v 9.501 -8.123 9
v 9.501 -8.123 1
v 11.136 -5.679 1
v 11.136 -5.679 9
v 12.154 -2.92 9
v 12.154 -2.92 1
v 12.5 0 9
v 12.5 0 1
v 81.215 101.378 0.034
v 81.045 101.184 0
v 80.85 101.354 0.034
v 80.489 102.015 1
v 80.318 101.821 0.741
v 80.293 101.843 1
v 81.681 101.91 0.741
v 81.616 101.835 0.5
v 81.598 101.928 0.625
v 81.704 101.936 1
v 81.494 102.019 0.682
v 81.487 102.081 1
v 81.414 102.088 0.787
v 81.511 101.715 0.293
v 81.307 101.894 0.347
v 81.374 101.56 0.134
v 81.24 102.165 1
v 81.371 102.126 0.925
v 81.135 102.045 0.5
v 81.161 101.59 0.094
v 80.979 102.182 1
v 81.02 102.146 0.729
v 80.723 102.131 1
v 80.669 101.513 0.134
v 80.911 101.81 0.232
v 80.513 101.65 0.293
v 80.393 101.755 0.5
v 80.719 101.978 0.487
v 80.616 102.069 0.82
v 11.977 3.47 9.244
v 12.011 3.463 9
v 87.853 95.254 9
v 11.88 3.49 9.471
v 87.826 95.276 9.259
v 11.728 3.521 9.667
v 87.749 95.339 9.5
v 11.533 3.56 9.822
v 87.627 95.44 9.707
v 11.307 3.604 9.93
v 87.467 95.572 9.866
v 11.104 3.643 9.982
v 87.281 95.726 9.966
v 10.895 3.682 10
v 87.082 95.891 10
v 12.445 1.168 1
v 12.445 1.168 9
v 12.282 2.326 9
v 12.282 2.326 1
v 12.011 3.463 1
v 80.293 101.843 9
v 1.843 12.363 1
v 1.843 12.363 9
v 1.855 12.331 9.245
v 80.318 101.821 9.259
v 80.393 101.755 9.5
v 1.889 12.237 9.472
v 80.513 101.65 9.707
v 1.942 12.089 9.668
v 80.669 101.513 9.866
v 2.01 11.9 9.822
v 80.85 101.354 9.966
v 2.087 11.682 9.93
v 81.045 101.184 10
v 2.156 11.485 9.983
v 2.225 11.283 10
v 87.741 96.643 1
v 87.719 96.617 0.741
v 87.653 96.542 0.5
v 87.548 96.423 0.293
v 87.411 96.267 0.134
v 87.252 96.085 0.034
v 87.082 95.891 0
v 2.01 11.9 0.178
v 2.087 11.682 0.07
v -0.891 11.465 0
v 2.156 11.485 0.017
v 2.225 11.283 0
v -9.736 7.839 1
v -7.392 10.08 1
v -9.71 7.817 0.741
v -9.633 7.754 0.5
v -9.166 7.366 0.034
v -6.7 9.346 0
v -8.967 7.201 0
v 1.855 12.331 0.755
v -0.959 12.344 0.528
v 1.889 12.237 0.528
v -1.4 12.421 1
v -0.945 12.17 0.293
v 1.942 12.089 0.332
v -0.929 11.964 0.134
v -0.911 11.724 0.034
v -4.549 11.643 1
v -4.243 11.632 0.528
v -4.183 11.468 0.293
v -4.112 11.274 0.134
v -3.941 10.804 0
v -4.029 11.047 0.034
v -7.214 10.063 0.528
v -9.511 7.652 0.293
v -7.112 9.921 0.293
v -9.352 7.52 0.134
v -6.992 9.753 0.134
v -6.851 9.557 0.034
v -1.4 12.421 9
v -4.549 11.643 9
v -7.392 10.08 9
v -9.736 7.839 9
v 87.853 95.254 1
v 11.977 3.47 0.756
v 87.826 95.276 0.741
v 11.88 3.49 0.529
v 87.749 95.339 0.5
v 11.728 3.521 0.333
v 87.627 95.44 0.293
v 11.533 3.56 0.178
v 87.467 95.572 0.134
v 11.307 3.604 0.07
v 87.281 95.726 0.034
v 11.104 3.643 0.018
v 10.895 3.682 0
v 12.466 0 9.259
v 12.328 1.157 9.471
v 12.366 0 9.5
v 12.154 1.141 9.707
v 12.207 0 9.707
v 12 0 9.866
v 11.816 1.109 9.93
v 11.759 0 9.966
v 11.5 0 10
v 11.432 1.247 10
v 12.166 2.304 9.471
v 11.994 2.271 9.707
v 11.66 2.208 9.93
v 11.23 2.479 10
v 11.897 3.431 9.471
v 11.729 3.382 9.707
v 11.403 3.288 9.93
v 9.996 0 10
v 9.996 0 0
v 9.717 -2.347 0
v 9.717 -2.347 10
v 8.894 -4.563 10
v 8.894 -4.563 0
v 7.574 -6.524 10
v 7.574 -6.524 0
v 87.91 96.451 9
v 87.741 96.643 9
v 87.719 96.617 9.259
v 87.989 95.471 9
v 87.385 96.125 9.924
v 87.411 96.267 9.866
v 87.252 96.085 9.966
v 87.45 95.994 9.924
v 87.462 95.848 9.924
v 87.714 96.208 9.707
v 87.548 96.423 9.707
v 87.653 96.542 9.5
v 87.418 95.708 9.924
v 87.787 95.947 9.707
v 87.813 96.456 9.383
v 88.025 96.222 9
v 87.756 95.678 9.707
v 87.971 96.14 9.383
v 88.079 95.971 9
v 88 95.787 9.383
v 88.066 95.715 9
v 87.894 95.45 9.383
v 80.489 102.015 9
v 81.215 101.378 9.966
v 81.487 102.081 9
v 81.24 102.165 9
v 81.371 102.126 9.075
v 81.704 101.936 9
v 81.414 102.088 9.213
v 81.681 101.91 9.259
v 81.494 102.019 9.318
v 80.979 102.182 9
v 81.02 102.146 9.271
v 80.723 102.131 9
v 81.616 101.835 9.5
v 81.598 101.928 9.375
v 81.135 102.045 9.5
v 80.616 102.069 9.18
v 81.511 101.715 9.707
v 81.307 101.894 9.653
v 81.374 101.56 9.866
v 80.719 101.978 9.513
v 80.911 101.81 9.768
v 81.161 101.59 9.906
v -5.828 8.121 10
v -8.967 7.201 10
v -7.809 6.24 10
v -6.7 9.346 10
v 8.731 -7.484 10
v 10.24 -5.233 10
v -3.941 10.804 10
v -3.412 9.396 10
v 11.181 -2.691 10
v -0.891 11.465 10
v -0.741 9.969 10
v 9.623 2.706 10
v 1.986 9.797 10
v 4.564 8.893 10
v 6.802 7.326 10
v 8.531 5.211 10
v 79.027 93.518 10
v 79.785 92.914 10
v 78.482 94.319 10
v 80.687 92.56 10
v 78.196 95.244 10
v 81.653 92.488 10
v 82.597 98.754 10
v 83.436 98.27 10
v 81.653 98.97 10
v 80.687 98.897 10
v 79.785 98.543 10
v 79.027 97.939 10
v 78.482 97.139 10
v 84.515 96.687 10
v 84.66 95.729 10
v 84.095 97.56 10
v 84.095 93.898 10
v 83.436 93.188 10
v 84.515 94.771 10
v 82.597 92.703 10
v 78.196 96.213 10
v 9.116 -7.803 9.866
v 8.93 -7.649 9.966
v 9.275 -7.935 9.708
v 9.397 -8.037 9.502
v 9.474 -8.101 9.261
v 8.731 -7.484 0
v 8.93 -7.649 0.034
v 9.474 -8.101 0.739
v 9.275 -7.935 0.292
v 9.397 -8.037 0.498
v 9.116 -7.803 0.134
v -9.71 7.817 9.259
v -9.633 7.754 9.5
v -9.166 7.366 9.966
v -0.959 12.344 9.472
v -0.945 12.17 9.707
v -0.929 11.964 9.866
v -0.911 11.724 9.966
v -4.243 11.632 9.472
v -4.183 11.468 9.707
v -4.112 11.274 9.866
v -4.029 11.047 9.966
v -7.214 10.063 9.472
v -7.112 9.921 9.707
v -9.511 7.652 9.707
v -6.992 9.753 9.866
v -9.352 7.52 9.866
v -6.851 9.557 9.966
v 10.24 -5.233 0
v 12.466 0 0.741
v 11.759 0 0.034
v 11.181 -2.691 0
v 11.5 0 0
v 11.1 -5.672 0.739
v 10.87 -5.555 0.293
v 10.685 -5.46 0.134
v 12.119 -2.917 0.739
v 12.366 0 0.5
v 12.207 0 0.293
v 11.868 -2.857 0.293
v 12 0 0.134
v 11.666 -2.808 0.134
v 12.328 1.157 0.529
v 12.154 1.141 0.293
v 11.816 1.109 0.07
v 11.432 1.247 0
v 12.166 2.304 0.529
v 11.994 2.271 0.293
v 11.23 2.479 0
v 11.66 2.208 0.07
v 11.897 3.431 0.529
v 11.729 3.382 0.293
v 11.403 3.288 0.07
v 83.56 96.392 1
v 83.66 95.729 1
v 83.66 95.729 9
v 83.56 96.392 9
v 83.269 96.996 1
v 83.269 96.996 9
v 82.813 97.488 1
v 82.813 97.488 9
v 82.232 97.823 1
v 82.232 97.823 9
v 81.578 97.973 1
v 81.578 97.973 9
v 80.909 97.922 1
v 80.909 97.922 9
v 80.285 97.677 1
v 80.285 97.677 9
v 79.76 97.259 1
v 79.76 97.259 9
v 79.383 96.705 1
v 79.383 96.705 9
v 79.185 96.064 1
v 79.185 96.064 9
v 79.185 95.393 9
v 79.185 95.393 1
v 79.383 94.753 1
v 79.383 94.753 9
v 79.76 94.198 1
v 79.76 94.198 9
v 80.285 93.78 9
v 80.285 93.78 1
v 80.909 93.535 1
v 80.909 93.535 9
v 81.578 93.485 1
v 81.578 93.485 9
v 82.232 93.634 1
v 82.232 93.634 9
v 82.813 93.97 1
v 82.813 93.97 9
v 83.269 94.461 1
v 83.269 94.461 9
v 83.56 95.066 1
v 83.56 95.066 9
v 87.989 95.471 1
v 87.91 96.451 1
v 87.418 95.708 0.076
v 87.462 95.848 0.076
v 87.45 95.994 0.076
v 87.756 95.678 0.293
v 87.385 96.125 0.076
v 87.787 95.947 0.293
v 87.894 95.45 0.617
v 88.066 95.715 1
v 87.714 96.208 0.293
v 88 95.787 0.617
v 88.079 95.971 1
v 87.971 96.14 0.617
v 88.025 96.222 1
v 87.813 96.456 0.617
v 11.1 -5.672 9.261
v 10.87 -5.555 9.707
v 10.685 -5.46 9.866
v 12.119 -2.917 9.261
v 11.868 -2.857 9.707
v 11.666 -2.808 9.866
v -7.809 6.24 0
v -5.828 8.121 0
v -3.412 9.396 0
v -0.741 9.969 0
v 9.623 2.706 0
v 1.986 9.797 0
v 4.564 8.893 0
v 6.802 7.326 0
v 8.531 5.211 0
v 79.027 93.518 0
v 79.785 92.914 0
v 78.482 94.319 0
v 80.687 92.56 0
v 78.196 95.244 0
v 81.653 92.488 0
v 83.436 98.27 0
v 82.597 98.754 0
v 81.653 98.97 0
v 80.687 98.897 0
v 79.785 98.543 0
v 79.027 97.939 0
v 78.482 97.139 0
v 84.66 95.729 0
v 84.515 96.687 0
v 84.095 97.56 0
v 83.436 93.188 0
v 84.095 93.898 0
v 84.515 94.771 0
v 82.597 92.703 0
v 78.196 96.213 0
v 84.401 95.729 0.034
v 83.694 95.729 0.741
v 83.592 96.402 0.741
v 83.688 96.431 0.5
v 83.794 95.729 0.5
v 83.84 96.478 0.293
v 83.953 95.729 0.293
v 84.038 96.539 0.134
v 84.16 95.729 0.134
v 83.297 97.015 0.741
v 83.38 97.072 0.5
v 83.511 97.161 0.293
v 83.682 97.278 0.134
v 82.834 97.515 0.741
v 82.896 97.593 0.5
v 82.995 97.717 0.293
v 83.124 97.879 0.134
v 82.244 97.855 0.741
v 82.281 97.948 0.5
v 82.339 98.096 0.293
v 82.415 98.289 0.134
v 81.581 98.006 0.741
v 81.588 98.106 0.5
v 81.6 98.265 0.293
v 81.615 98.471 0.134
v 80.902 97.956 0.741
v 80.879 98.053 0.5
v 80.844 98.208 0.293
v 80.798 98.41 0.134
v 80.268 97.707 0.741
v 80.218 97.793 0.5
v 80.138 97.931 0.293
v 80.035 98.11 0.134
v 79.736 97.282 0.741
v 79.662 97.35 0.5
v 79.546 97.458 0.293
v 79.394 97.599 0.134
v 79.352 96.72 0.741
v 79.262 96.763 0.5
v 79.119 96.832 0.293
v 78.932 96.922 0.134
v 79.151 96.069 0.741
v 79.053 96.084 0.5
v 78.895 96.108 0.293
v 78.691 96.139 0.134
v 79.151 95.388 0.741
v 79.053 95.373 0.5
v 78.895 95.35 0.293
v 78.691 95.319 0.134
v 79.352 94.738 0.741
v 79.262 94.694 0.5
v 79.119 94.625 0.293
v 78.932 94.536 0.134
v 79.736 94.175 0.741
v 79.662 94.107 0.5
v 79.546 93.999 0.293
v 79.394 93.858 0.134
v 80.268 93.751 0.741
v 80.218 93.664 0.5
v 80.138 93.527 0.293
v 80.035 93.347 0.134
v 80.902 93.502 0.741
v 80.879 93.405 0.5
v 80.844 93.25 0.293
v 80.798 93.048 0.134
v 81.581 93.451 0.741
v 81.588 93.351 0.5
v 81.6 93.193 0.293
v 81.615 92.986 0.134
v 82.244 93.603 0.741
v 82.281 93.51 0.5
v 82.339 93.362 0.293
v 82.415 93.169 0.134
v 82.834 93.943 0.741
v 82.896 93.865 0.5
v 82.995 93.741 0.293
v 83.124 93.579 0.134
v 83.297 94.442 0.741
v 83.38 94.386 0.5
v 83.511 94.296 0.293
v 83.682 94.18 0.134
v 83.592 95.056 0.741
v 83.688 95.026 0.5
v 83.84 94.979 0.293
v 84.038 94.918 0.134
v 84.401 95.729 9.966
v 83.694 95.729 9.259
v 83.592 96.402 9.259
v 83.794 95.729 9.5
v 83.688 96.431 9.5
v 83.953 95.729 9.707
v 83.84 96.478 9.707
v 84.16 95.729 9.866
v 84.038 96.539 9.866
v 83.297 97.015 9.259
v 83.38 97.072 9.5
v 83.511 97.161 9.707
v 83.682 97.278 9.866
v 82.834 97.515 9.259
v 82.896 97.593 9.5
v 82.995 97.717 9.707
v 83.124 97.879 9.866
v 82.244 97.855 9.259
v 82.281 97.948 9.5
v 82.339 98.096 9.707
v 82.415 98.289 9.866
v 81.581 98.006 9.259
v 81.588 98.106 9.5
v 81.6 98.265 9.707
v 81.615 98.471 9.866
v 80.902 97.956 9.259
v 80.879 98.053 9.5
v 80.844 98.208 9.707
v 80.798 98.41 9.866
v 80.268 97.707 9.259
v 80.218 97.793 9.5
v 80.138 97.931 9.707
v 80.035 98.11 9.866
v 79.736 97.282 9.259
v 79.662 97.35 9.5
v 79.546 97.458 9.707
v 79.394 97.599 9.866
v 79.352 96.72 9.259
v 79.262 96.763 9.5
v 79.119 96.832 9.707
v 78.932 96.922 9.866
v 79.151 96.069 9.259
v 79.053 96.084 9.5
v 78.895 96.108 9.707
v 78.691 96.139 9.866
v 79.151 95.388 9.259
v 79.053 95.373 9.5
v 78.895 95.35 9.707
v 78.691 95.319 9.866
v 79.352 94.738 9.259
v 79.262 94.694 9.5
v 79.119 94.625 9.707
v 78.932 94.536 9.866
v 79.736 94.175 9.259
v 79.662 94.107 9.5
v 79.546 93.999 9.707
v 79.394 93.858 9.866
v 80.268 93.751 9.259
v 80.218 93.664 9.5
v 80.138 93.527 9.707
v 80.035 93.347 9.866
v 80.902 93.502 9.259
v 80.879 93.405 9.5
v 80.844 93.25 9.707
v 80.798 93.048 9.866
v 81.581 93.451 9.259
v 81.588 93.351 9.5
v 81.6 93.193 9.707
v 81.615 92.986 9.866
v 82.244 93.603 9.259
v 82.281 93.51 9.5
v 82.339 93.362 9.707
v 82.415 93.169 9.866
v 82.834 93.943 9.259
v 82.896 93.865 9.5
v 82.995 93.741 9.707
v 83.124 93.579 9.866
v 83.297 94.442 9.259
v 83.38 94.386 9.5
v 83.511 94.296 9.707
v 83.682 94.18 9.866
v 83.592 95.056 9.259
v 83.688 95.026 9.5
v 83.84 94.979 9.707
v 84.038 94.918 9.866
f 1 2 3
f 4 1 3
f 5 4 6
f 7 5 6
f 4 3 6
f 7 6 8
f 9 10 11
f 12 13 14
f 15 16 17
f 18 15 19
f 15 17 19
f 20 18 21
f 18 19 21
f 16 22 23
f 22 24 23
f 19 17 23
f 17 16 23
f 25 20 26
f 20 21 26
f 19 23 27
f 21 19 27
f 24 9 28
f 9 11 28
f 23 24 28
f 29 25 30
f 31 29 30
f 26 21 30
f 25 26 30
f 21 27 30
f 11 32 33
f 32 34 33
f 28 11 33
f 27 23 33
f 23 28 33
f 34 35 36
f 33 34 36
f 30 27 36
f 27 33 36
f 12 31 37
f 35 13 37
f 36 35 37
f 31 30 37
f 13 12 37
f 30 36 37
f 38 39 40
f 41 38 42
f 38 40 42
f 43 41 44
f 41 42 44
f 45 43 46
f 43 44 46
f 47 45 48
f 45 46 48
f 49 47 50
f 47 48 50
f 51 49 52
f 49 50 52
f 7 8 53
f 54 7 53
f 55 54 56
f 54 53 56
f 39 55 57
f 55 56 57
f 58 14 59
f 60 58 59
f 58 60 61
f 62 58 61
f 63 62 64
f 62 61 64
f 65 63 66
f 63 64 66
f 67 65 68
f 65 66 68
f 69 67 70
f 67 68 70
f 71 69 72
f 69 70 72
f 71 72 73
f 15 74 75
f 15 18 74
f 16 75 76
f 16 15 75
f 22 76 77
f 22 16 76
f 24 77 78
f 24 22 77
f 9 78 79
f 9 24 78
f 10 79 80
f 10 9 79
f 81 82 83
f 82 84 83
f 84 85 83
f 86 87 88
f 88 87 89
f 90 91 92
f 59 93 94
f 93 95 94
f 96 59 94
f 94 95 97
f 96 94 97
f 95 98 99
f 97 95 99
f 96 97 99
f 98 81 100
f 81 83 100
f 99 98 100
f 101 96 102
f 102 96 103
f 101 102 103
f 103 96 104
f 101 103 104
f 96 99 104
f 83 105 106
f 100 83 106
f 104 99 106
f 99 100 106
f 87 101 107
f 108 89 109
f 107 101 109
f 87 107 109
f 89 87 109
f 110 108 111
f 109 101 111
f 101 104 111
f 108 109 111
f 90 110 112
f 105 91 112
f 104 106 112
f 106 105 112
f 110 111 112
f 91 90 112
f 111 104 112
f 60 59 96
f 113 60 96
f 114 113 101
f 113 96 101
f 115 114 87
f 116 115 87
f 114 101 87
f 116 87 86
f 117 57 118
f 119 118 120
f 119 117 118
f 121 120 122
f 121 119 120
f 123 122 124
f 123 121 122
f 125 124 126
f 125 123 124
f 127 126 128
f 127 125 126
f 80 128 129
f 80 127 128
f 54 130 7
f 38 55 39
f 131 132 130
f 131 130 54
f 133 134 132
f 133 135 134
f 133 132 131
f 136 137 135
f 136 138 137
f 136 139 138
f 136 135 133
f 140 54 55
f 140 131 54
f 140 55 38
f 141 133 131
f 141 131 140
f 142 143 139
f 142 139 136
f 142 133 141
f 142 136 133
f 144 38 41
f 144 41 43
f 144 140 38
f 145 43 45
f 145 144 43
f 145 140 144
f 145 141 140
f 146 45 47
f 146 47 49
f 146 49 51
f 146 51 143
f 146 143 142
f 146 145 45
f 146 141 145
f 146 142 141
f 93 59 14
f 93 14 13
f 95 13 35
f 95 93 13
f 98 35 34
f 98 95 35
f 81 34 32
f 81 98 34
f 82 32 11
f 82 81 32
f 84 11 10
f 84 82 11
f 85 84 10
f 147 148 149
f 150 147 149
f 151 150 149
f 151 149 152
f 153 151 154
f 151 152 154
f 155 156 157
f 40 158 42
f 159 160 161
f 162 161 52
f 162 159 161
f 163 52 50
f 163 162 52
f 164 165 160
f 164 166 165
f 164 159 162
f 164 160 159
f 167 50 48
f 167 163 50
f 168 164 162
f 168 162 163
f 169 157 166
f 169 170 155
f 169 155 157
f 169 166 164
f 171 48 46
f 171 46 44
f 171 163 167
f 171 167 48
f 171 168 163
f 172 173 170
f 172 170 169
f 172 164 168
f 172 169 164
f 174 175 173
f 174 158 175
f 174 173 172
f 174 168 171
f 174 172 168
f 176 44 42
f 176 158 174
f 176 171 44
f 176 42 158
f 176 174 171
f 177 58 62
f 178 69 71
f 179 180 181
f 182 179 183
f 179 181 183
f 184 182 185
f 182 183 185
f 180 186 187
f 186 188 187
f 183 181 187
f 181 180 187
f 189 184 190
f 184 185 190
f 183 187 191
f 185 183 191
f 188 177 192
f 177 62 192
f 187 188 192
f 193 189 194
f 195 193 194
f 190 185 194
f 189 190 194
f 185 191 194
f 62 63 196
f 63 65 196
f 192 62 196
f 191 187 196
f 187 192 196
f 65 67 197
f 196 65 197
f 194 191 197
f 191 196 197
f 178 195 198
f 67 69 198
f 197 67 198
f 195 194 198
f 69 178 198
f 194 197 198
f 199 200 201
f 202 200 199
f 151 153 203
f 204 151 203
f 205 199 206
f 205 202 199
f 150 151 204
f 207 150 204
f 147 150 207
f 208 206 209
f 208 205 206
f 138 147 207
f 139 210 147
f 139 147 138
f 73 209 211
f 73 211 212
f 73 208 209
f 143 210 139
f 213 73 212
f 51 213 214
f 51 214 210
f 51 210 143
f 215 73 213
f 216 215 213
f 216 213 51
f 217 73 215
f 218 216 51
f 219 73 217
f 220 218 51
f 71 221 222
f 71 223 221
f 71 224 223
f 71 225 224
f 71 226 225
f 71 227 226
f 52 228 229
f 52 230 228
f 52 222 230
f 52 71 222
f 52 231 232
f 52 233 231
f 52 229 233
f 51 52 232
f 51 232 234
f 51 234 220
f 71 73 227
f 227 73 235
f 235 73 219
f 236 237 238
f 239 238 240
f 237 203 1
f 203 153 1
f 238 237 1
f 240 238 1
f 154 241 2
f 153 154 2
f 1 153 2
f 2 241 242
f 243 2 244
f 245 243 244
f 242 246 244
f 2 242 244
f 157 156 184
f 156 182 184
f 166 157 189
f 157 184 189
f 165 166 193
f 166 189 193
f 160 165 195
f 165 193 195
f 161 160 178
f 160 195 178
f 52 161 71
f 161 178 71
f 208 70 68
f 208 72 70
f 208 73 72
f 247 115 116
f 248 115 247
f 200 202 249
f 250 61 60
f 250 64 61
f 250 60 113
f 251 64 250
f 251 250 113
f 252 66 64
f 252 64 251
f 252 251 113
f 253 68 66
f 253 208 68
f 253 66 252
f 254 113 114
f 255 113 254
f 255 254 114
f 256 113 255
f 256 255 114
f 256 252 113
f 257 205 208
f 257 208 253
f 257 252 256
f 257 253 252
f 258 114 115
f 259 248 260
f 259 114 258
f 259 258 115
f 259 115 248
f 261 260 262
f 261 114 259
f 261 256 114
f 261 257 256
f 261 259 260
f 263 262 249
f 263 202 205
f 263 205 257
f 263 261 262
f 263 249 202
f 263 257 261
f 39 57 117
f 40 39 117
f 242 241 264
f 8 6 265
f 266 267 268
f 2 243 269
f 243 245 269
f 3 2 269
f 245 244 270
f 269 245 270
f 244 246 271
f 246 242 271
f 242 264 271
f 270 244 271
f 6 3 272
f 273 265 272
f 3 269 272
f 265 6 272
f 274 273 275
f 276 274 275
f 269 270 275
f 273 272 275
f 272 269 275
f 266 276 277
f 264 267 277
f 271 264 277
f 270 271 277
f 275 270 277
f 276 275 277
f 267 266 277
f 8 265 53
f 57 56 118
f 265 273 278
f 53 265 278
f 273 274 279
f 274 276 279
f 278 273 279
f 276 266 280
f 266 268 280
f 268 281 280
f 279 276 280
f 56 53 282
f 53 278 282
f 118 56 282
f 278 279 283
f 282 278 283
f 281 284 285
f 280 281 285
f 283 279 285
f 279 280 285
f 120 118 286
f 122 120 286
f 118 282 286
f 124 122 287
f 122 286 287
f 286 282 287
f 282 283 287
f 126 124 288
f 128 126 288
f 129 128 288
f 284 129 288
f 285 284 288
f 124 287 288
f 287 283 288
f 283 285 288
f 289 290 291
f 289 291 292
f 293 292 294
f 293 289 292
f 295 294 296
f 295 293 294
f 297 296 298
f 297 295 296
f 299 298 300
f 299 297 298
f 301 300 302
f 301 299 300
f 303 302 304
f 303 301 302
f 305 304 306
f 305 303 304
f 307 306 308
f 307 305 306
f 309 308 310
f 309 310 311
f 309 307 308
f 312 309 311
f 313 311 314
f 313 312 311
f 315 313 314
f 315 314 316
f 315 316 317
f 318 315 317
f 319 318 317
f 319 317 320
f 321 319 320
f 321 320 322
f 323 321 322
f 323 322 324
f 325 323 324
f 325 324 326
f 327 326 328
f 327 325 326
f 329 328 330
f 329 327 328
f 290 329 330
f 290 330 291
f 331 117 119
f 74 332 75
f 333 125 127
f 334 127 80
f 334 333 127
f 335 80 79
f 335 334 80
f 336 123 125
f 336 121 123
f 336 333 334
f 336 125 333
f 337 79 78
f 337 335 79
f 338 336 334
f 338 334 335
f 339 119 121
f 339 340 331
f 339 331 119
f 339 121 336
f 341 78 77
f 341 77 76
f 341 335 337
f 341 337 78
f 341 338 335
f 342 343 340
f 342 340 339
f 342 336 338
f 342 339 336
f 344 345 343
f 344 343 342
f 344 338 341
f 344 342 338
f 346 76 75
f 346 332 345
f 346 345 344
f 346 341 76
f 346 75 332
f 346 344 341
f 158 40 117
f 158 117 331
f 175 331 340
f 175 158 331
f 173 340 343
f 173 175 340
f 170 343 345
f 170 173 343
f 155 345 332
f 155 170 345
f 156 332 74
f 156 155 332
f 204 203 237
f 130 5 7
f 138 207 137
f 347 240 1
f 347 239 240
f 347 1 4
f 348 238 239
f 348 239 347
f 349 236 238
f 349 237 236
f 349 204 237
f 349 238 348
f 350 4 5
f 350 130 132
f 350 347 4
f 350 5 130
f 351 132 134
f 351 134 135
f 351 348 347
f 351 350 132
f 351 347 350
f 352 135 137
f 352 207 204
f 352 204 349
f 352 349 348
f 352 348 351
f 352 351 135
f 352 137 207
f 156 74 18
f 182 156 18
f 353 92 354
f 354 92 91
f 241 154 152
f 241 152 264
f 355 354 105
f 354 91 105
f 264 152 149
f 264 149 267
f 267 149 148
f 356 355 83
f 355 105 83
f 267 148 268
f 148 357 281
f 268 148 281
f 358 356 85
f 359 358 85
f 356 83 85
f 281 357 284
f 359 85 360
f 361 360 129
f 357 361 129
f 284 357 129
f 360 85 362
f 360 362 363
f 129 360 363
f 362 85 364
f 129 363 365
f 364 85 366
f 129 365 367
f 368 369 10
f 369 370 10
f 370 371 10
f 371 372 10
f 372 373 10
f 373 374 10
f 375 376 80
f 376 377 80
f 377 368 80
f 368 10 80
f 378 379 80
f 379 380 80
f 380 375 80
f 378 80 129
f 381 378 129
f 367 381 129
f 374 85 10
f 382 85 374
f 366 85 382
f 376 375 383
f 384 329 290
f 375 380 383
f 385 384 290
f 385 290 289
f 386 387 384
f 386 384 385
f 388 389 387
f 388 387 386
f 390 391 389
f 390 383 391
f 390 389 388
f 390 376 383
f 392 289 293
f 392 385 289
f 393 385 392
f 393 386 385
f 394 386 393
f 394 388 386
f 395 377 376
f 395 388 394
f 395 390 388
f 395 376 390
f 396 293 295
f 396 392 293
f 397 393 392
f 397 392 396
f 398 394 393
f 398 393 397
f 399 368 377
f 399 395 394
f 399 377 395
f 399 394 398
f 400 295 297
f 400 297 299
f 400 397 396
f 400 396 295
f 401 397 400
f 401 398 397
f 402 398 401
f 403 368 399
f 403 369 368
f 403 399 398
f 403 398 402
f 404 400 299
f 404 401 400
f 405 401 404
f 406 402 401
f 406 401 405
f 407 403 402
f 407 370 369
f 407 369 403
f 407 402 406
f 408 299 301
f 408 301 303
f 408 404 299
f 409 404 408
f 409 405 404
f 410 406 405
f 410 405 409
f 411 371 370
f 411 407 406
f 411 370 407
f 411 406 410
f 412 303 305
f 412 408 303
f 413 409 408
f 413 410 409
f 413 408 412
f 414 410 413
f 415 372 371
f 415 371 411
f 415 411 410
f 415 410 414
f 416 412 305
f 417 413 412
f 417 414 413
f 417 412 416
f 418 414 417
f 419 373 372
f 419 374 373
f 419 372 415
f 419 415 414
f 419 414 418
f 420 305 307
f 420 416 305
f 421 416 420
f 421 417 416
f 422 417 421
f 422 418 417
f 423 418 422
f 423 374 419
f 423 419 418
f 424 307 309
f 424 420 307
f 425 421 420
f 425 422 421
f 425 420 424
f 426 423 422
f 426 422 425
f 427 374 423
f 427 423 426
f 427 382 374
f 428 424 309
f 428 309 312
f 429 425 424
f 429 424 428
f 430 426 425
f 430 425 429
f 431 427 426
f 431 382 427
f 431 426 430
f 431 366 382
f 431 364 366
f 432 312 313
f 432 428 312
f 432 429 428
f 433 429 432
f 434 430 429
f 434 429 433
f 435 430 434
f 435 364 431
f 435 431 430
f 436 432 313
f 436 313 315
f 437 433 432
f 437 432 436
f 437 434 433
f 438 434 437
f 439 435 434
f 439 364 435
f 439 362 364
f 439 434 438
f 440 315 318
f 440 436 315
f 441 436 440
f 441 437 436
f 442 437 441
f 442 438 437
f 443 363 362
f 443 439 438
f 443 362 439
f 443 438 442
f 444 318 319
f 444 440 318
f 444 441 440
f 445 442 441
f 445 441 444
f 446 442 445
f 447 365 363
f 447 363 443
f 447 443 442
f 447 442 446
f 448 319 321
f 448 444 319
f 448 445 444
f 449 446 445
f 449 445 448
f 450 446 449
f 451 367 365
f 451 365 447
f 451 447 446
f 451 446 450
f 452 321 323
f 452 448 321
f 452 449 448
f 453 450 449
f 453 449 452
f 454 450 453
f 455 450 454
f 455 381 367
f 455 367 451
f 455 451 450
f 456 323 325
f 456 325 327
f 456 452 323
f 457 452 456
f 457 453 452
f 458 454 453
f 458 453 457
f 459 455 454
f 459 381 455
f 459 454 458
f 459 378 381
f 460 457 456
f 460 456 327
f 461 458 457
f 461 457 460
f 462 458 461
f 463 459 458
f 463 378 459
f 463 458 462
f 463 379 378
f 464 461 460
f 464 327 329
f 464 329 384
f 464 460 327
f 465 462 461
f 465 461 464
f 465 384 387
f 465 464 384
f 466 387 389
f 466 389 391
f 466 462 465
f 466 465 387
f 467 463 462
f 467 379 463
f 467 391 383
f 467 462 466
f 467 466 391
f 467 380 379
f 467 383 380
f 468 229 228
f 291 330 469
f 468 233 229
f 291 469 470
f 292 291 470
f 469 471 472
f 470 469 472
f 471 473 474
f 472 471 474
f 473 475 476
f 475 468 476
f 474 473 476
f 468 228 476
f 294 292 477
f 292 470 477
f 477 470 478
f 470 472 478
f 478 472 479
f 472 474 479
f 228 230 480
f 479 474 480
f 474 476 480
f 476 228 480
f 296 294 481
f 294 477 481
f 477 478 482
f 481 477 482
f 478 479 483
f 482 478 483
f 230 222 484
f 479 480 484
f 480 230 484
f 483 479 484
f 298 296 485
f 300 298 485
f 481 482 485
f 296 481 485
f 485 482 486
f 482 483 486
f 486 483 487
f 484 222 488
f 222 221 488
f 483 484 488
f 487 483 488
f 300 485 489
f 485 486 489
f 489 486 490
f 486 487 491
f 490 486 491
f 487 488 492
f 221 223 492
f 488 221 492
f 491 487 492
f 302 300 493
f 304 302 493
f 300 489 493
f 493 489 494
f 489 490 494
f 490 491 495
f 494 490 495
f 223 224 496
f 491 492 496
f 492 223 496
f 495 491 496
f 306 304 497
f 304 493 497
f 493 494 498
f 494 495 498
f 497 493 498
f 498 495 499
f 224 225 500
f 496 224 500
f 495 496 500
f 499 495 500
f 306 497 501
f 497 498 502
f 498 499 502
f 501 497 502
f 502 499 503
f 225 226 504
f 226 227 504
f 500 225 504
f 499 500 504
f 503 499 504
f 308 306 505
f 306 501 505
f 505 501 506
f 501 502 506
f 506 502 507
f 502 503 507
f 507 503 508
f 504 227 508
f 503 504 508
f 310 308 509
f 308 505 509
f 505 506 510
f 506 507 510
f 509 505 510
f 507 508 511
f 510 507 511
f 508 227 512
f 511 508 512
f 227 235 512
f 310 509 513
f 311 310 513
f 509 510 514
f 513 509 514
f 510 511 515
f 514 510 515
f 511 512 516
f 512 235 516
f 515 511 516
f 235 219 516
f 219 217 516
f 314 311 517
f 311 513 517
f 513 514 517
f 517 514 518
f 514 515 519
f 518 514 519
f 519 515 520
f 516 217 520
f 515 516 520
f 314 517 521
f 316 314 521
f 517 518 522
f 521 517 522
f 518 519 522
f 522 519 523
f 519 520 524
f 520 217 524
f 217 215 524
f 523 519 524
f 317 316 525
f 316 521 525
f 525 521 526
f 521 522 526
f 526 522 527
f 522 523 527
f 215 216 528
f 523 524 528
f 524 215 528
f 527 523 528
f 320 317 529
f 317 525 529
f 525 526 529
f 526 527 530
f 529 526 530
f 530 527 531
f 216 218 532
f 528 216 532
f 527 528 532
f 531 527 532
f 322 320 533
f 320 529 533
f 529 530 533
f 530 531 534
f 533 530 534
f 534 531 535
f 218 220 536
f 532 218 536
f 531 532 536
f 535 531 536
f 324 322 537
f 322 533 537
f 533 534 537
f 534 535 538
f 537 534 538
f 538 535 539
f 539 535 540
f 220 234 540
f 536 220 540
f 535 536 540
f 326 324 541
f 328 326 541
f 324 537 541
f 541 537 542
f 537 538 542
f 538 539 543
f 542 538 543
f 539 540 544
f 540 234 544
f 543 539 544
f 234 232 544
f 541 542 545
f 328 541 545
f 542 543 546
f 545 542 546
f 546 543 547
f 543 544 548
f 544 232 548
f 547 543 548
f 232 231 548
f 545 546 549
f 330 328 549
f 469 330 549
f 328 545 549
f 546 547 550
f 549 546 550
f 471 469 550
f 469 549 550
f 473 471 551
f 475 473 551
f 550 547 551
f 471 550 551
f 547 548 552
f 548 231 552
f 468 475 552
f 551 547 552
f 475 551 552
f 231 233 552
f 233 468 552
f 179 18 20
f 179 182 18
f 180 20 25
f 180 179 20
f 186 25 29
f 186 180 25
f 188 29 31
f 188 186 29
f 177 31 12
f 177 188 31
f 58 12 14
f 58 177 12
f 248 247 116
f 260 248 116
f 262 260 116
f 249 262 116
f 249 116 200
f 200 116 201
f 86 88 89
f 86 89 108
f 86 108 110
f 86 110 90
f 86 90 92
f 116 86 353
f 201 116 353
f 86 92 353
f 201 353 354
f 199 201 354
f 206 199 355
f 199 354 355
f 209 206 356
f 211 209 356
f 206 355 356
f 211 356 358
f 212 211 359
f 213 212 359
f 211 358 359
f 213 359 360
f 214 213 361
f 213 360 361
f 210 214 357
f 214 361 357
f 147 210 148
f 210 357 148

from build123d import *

# Parameters (mm, degrees)
F0_R     = 2.25
F1_DEPTH = 10
F2_R     = 1


with BuildPart() as f1:
    # F0 (on Top) → F1 (new body)
    with BuildSketch(Plane.XY):
        with BuildLine():
            ThreePointArc((9.5009885105, -8.1228823285), (11.7263028355, -4.3294135641), (12.5, 0))
            ThreePointArc((12.5, 0), (12.3770625391, 1.7488061363), (12.0106683356, 3.4632132668))
            ThreePointArc((12.0106683356, 3.4632132668), (8.2330297979, 9.4057014808), (1.8427561446, 12.3634238701))
            ThreePointArc((1.8427561446, 12.3634238701), (-4.5491075048, 11.6428356044), (-9.7363625852, 7.8392119253))
            Line((-9.7363625852, 7.8392119253), (-7.8092353717, 6.240187919))
            ThreePointArc((-7.8092353717, 6.240187919), (3.3061601135, 9.4336317322), (9.9962043974, 0))
            ThreePointArc((9.9962043974, 0), (9.3710716558, -3.4795284703), (7.573861297, -6.5238583222))
            Line((7.573861297, -6.5238583222), (9.5009885105, -8.1228823285))
        make_face()
        with BuildLine():
            ThreePointArc((1.8427561446, 12.3634238701), (8.2330297979, 9.4057014808), (12.0106683356, 3.4632132668))
            Line((12.0106683356, 3.4632132668), (88.4712676923, 96.0025354569))
            Line((88.4712676923, 96.0025354569), (80.951972171, 102.5949701258))
            Line((80.951972171, 102.5949701258), (1.8427561446, 12.3634238701))
        make_face()
        with Locations((81.4098492265, 95.7288071513)):
            Circle(F0_R, mode=Mode.SUBTRACT)
    extrude(amount=F1_DEPTH)

    # F2
    f2_edges = [f1.edges().sort_by_distance(p)[0] for p in [
        (41.397364, 57.479197, 10),
        (12.216679, -2.646271, 10),
        (50.240968, 49.732874, 10),
        (-4.549108, 11.642836, 10),
        (12.216679, -2.646271, 0),
        (-4.549108, 11.642836, 0),
        (50.240968, 49.732874, 0),
        (41.397364, 57.479197, 0),
        (79.159849, 95.728807, 0),
        (84.71162, 99.298753, 0),
        (79.159849, 95.728807, 10),
        (88.471268, 96.002535, 5),
        (80.951972, 102.59497, 5),
        (84.71162, 99.298753, 10),
    ]]
    fillet(f2_edges, radius=F2_R)


solid = f1.part
